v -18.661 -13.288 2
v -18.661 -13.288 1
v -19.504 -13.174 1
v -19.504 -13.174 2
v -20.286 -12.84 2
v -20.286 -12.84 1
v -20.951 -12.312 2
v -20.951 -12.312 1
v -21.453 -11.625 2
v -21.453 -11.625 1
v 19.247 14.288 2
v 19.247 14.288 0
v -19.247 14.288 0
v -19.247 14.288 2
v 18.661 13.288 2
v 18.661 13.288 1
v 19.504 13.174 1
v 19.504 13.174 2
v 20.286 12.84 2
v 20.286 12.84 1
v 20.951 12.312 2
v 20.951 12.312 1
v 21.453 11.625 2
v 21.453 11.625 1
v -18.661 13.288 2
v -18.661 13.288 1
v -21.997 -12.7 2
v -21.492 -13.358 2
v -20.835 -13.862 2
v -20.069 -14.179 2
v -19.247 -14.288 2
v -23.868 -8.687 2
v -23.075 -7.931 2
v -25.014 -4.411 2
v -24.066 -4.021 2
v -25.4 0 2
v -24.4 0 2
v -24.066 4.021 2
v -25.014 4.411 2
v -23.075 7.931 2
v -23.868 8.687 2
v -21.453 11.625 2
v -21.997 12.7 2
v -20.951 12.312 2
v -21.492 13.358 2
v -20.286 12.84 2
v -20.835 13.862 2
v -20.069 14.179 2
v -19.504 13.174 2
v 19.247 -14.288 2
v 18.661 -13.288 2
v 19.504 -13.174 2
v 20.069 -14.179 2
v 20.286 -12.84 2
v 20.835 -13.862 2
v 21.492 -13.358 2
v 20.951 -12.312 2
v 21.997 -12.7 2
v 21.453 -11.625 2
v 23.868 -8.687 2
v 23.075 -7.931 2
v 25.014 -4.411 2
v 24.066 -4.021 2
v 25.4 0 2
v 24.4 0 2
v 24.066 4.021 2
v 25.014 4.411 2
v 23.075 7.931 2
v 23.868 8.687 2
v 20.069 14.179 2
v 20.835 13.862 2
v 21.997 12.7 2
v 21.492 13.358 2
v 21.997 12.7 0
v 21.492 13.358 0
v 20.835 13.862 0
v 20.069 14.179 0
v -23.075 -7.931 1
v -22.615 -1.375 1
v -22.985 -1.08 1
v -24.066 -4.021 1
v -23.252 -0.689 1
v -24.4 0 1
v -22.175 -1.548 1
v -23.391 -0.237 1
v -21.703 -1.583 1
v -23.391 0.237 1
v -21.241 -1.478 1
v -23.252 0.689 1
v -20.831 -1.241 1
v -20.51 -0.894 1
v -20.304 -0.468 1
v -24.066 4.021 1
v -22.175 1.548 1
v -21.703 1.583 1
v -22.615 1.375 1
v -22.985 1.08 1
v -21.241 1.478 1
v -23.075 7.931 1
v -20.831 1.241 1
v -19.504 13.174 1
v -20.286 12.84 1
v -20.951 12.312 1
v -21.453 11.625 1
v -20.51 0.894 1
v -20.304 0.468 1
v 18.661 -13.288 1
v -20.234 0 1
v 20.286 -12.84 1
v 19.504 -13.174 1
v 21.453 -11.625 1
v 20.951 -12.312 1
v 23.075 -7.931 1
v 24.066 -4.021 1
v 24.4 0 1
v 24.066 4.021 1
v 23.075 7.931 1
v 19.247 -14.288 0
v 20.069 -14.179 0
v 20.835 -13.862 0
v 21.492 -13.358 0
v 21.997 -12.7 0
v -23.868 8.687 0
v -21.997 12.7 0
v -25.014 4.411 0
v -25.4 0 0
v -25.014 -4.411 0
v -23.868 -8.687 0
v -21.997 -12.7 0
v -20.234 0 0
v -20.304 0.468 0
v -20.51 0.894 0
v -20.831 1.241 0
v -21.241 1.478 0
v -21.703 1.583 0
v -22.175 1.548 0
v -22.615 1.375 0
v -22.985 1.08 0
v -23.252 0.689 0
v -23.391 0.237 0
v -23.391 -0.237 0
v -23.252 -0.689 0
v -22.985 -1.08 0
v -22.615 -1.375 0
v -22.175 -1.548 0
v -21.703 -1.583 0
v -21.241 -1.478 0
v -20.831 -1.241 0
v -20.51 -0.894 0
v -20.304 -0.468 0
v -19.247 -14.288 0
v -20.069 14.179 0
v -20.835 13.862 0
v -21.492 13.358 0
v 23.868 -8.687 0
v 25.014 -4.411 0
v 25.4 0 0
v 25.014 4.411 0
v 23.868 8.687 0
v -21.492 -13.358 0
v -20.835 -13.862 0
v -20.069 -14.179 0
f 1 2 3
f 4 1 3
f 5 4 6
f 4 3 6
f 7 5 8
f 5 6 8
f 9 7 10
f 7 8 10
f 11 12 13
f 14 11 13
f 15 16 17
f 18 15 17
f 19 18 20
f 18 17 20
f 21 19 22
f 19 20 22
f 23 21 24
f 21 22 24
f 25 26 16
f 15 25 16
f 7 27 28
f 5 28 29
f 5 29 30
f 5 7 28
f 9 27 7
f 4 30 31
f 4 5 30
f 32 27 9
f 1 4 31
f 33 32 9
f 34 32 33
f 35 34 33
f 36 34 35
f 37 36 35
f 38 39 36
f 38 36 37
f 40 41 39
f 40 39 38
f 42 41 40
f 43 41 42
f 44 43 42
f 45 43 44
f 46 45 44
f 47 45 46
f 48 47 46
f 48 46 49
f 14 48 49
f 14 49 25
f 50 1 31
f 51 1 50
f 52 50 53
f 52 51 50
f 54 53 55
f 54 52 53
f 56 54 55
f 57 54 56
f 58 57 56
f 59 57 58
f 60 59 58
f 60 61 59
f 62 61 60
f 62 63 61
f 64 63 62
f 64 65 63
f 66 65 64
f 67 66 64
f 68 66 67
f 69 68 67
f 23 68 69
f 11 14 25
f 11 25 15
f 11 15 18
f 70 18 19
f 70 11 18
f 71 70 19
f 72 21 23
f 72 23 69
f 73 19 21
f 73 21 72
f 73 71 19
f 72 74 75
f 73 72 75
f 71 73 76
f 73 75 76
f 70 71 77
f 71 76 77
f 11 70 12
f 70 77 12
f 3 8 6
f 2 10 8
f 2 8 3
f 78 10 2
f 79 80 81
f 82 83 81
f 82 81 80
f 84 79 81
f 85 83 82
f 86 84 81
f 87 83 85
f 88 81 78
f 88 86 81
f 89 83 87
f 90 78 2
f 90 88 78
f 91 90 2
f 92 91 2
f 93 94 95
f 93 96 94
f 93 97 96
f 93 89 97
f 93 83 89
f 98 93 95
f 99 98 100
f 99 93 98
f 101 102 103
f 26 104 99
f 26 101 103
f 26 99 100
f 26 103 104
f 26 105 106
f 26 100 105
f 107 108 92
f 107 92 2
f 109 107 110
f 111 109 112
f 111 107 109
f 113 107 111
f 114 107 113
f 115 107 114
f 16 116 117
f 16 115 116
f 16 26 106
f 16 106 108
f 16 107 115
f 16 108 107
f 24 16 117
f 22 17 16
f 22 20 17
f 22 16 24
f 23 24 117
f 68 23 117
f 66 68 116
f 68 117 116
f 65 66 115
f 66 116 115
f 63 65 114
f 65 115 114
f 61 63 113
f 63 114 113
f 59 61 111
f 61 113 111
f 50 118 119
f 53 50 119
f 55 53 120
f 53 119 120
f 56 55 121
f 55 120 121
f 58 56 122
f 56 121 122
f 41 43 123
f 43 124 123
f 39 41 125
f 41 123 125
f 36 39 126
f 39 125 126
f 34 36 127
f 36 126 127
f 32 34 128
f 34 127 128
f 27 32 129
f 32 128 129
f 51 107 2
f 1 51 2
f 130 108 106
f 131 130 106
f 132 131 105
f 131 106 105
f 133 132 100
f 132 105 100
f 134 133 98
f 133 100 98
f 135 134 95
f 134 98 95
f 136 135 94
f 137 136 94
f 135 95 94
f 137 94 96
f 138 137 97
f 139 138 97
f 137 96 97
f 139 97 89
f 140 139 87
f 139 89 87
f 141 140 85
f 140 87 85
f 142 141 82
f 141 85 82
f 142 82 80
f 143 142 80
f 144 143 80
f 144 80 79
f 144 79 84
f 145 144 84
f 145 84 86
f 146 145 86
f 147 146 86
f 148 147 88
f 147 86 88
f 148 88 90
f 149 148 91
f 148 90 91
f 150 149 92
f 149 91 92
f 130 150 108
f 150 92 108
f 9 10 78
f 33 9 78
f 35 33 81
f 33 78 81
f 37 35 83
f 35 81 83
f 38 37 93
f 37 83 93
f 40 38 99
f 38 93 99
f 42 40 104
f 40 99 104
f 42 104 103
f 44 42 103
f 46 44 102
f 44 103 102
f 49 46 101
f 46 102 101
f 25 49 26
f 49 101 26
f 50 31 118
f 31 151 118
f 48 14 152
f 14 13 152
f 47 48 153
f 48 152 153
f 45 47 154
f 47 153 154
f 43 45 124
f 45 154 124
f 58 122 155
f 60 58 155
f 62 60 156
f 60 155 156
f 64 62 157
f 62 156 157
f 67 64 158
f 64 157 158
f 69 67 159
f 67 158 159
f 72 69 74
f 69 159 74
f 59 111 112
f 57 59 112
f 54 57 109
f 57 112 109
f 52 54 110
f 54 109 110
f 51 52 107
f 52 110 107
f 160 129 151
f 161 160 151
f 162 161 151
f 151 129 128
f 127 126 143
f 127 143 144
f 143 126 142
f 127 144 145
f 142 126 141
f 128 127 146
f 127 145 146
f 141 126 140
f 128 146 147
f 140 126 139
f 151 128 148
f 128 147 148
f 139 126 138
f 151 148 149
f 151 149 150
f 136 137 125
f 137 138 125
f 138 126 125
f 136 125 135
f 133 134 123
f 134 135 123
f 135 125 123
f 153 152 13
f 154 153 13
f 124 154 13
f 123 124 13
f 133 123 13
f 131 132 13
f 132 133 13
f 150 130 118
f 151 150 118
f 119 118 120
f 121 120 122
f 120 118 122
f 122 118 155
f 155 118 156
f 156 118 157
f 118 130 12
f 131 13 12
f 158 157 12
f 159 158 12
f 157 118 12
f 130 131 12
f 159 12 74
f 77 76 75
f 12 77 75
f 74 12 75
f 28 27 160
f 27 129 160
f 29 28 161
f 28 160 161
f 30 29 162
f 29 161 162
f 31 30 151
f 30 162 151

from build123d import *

# Parameters (mm, degrees)
F1_DEPTH = 1
F3_DEPTH = 1
F4_R     = 1.5875
F5_DEPTH = 1


# Not quite as in the source:
# - the program builds the solid bodies; features that only make, move or delete a surface that nothing else refers to are left out


with BuildPart() as f1:
    # F0 (on Top) → F1 (new body)
    with BuildSketch(Plane.XY):
        with BuildLine():
            ThreePointArc((-19.2474145991, 14.2875), (-20.8349145991, 13.862130657), (-21.9970452561, 12.7))
            ThreePointArc((-21.9970452561, 12.7), (-25.4, 0), (-21.9970452561, -12.7))
            ThreePointArc((-21.9970452561, -12.7), (-20.8349145991, -13.862130657), (-19.2474145991, -14.2875))
            Line((-19.2474145991, -14.2875), (19.2474145991, -14.2875))
            ThreePointArc((19.2474145991, -14.2875), (20.8349145991, -13.862130657), (21.9970452561, -12.7))
            ThreePointArc((21.9970452561, -12.7), (25.4, 0), (21.9970452561, 12.7))
            ThreePointArc((21.9970452561, 12.7), (20.8349145991, 13.862130657), (19.2474145991, 14.2875))
            Line((19.2474145991, 14.2875), (-19.2474145991, 14.2875))
        make_face()
    extrude(amount=F1_DEPTH)

    # F2 (on face) → F3 (join)
    with BuildSketch(Plane.XY.offset(1)):
        with BuildLine():
            Line((19.2474145991, 14.2875), (-19.2474145991, 14.2875))
            ThreePointArc((-19.2474145991, 14.2875), (-20.8349145991, 13.862130657), (-21.9970452561, 12.7))
            ThreePointArc((-21.9970452561, 12.7), (-25.4, 0), (-21.9970452561, -12.7))
            ThreePointArc((-21.9970452561, -12.7), (-20.8349145991, -13.862130657), (-19.2474145991, -14.2875))
            Line((-19.2474145991, -14.2875), (19.2474145991, -14.2875))
            ThreePointArc((19.2474145991, -14.2875), (20.8349145991, -13.862130657), (21.9970452561, -12.7))
            ThreePointArc((21.9970452561, -12.7), (25.4, 0), (21.9970452561, 12.7))
            ThreePointArc((21.9970452561, 12.7), (20.8349145991, 13.862130657), (19.2474145991, 14.2875))
        make_face()
        with BuildLine():
            ThreePointArc((-21.4526124879, 11.6252061249), (-20.2856017842, 12.8404540819), (-18.6611352482, 13.2875))
            Line((-18.6611352482, 13.2875), (18.6611352482, 13.2875))
            ThreePointArc((18.6611352482, 13.2875), (20.2856017842, 12.8404540819), (21.4526124879, 11.6252061249))
            ThreePointArc((21.4526124879, 11.6252061249), (24.4, 0), (21.4526124879, -11.6252061249))
            ThreePointArc((21.4526124879, -11.6252061249), (20.2856017842, -12.8404540819), (18.6611352482, -13.2875))
            Line((18.6611352482, -13.2875), (-18.6611352482, -13.2875))
            ThreePointArc((-18.6611352482, -13.2875), (-20.2856017842, -12.8404540819), (-21.4526124879, -11.6252061249))
            ThreePointArc((-21.4526124879, -11.6252061249), (-24.4, 0), (-21.4526124879, 11.6252061249))
        make_face(mode=Mode.SUBTRACT)
    extrude(amount=F3_DEPTH)

    # F4 (on face) → F5 (cut)
    with BuildSketch(Plane.XY.offset(1)):
        with Locations((-21.821282804, 0)):
            Circle(F4_R)
    extrude(amount=-F5_DEPTH, mode=Mode.SUBTRACT)


solid = f1.part
